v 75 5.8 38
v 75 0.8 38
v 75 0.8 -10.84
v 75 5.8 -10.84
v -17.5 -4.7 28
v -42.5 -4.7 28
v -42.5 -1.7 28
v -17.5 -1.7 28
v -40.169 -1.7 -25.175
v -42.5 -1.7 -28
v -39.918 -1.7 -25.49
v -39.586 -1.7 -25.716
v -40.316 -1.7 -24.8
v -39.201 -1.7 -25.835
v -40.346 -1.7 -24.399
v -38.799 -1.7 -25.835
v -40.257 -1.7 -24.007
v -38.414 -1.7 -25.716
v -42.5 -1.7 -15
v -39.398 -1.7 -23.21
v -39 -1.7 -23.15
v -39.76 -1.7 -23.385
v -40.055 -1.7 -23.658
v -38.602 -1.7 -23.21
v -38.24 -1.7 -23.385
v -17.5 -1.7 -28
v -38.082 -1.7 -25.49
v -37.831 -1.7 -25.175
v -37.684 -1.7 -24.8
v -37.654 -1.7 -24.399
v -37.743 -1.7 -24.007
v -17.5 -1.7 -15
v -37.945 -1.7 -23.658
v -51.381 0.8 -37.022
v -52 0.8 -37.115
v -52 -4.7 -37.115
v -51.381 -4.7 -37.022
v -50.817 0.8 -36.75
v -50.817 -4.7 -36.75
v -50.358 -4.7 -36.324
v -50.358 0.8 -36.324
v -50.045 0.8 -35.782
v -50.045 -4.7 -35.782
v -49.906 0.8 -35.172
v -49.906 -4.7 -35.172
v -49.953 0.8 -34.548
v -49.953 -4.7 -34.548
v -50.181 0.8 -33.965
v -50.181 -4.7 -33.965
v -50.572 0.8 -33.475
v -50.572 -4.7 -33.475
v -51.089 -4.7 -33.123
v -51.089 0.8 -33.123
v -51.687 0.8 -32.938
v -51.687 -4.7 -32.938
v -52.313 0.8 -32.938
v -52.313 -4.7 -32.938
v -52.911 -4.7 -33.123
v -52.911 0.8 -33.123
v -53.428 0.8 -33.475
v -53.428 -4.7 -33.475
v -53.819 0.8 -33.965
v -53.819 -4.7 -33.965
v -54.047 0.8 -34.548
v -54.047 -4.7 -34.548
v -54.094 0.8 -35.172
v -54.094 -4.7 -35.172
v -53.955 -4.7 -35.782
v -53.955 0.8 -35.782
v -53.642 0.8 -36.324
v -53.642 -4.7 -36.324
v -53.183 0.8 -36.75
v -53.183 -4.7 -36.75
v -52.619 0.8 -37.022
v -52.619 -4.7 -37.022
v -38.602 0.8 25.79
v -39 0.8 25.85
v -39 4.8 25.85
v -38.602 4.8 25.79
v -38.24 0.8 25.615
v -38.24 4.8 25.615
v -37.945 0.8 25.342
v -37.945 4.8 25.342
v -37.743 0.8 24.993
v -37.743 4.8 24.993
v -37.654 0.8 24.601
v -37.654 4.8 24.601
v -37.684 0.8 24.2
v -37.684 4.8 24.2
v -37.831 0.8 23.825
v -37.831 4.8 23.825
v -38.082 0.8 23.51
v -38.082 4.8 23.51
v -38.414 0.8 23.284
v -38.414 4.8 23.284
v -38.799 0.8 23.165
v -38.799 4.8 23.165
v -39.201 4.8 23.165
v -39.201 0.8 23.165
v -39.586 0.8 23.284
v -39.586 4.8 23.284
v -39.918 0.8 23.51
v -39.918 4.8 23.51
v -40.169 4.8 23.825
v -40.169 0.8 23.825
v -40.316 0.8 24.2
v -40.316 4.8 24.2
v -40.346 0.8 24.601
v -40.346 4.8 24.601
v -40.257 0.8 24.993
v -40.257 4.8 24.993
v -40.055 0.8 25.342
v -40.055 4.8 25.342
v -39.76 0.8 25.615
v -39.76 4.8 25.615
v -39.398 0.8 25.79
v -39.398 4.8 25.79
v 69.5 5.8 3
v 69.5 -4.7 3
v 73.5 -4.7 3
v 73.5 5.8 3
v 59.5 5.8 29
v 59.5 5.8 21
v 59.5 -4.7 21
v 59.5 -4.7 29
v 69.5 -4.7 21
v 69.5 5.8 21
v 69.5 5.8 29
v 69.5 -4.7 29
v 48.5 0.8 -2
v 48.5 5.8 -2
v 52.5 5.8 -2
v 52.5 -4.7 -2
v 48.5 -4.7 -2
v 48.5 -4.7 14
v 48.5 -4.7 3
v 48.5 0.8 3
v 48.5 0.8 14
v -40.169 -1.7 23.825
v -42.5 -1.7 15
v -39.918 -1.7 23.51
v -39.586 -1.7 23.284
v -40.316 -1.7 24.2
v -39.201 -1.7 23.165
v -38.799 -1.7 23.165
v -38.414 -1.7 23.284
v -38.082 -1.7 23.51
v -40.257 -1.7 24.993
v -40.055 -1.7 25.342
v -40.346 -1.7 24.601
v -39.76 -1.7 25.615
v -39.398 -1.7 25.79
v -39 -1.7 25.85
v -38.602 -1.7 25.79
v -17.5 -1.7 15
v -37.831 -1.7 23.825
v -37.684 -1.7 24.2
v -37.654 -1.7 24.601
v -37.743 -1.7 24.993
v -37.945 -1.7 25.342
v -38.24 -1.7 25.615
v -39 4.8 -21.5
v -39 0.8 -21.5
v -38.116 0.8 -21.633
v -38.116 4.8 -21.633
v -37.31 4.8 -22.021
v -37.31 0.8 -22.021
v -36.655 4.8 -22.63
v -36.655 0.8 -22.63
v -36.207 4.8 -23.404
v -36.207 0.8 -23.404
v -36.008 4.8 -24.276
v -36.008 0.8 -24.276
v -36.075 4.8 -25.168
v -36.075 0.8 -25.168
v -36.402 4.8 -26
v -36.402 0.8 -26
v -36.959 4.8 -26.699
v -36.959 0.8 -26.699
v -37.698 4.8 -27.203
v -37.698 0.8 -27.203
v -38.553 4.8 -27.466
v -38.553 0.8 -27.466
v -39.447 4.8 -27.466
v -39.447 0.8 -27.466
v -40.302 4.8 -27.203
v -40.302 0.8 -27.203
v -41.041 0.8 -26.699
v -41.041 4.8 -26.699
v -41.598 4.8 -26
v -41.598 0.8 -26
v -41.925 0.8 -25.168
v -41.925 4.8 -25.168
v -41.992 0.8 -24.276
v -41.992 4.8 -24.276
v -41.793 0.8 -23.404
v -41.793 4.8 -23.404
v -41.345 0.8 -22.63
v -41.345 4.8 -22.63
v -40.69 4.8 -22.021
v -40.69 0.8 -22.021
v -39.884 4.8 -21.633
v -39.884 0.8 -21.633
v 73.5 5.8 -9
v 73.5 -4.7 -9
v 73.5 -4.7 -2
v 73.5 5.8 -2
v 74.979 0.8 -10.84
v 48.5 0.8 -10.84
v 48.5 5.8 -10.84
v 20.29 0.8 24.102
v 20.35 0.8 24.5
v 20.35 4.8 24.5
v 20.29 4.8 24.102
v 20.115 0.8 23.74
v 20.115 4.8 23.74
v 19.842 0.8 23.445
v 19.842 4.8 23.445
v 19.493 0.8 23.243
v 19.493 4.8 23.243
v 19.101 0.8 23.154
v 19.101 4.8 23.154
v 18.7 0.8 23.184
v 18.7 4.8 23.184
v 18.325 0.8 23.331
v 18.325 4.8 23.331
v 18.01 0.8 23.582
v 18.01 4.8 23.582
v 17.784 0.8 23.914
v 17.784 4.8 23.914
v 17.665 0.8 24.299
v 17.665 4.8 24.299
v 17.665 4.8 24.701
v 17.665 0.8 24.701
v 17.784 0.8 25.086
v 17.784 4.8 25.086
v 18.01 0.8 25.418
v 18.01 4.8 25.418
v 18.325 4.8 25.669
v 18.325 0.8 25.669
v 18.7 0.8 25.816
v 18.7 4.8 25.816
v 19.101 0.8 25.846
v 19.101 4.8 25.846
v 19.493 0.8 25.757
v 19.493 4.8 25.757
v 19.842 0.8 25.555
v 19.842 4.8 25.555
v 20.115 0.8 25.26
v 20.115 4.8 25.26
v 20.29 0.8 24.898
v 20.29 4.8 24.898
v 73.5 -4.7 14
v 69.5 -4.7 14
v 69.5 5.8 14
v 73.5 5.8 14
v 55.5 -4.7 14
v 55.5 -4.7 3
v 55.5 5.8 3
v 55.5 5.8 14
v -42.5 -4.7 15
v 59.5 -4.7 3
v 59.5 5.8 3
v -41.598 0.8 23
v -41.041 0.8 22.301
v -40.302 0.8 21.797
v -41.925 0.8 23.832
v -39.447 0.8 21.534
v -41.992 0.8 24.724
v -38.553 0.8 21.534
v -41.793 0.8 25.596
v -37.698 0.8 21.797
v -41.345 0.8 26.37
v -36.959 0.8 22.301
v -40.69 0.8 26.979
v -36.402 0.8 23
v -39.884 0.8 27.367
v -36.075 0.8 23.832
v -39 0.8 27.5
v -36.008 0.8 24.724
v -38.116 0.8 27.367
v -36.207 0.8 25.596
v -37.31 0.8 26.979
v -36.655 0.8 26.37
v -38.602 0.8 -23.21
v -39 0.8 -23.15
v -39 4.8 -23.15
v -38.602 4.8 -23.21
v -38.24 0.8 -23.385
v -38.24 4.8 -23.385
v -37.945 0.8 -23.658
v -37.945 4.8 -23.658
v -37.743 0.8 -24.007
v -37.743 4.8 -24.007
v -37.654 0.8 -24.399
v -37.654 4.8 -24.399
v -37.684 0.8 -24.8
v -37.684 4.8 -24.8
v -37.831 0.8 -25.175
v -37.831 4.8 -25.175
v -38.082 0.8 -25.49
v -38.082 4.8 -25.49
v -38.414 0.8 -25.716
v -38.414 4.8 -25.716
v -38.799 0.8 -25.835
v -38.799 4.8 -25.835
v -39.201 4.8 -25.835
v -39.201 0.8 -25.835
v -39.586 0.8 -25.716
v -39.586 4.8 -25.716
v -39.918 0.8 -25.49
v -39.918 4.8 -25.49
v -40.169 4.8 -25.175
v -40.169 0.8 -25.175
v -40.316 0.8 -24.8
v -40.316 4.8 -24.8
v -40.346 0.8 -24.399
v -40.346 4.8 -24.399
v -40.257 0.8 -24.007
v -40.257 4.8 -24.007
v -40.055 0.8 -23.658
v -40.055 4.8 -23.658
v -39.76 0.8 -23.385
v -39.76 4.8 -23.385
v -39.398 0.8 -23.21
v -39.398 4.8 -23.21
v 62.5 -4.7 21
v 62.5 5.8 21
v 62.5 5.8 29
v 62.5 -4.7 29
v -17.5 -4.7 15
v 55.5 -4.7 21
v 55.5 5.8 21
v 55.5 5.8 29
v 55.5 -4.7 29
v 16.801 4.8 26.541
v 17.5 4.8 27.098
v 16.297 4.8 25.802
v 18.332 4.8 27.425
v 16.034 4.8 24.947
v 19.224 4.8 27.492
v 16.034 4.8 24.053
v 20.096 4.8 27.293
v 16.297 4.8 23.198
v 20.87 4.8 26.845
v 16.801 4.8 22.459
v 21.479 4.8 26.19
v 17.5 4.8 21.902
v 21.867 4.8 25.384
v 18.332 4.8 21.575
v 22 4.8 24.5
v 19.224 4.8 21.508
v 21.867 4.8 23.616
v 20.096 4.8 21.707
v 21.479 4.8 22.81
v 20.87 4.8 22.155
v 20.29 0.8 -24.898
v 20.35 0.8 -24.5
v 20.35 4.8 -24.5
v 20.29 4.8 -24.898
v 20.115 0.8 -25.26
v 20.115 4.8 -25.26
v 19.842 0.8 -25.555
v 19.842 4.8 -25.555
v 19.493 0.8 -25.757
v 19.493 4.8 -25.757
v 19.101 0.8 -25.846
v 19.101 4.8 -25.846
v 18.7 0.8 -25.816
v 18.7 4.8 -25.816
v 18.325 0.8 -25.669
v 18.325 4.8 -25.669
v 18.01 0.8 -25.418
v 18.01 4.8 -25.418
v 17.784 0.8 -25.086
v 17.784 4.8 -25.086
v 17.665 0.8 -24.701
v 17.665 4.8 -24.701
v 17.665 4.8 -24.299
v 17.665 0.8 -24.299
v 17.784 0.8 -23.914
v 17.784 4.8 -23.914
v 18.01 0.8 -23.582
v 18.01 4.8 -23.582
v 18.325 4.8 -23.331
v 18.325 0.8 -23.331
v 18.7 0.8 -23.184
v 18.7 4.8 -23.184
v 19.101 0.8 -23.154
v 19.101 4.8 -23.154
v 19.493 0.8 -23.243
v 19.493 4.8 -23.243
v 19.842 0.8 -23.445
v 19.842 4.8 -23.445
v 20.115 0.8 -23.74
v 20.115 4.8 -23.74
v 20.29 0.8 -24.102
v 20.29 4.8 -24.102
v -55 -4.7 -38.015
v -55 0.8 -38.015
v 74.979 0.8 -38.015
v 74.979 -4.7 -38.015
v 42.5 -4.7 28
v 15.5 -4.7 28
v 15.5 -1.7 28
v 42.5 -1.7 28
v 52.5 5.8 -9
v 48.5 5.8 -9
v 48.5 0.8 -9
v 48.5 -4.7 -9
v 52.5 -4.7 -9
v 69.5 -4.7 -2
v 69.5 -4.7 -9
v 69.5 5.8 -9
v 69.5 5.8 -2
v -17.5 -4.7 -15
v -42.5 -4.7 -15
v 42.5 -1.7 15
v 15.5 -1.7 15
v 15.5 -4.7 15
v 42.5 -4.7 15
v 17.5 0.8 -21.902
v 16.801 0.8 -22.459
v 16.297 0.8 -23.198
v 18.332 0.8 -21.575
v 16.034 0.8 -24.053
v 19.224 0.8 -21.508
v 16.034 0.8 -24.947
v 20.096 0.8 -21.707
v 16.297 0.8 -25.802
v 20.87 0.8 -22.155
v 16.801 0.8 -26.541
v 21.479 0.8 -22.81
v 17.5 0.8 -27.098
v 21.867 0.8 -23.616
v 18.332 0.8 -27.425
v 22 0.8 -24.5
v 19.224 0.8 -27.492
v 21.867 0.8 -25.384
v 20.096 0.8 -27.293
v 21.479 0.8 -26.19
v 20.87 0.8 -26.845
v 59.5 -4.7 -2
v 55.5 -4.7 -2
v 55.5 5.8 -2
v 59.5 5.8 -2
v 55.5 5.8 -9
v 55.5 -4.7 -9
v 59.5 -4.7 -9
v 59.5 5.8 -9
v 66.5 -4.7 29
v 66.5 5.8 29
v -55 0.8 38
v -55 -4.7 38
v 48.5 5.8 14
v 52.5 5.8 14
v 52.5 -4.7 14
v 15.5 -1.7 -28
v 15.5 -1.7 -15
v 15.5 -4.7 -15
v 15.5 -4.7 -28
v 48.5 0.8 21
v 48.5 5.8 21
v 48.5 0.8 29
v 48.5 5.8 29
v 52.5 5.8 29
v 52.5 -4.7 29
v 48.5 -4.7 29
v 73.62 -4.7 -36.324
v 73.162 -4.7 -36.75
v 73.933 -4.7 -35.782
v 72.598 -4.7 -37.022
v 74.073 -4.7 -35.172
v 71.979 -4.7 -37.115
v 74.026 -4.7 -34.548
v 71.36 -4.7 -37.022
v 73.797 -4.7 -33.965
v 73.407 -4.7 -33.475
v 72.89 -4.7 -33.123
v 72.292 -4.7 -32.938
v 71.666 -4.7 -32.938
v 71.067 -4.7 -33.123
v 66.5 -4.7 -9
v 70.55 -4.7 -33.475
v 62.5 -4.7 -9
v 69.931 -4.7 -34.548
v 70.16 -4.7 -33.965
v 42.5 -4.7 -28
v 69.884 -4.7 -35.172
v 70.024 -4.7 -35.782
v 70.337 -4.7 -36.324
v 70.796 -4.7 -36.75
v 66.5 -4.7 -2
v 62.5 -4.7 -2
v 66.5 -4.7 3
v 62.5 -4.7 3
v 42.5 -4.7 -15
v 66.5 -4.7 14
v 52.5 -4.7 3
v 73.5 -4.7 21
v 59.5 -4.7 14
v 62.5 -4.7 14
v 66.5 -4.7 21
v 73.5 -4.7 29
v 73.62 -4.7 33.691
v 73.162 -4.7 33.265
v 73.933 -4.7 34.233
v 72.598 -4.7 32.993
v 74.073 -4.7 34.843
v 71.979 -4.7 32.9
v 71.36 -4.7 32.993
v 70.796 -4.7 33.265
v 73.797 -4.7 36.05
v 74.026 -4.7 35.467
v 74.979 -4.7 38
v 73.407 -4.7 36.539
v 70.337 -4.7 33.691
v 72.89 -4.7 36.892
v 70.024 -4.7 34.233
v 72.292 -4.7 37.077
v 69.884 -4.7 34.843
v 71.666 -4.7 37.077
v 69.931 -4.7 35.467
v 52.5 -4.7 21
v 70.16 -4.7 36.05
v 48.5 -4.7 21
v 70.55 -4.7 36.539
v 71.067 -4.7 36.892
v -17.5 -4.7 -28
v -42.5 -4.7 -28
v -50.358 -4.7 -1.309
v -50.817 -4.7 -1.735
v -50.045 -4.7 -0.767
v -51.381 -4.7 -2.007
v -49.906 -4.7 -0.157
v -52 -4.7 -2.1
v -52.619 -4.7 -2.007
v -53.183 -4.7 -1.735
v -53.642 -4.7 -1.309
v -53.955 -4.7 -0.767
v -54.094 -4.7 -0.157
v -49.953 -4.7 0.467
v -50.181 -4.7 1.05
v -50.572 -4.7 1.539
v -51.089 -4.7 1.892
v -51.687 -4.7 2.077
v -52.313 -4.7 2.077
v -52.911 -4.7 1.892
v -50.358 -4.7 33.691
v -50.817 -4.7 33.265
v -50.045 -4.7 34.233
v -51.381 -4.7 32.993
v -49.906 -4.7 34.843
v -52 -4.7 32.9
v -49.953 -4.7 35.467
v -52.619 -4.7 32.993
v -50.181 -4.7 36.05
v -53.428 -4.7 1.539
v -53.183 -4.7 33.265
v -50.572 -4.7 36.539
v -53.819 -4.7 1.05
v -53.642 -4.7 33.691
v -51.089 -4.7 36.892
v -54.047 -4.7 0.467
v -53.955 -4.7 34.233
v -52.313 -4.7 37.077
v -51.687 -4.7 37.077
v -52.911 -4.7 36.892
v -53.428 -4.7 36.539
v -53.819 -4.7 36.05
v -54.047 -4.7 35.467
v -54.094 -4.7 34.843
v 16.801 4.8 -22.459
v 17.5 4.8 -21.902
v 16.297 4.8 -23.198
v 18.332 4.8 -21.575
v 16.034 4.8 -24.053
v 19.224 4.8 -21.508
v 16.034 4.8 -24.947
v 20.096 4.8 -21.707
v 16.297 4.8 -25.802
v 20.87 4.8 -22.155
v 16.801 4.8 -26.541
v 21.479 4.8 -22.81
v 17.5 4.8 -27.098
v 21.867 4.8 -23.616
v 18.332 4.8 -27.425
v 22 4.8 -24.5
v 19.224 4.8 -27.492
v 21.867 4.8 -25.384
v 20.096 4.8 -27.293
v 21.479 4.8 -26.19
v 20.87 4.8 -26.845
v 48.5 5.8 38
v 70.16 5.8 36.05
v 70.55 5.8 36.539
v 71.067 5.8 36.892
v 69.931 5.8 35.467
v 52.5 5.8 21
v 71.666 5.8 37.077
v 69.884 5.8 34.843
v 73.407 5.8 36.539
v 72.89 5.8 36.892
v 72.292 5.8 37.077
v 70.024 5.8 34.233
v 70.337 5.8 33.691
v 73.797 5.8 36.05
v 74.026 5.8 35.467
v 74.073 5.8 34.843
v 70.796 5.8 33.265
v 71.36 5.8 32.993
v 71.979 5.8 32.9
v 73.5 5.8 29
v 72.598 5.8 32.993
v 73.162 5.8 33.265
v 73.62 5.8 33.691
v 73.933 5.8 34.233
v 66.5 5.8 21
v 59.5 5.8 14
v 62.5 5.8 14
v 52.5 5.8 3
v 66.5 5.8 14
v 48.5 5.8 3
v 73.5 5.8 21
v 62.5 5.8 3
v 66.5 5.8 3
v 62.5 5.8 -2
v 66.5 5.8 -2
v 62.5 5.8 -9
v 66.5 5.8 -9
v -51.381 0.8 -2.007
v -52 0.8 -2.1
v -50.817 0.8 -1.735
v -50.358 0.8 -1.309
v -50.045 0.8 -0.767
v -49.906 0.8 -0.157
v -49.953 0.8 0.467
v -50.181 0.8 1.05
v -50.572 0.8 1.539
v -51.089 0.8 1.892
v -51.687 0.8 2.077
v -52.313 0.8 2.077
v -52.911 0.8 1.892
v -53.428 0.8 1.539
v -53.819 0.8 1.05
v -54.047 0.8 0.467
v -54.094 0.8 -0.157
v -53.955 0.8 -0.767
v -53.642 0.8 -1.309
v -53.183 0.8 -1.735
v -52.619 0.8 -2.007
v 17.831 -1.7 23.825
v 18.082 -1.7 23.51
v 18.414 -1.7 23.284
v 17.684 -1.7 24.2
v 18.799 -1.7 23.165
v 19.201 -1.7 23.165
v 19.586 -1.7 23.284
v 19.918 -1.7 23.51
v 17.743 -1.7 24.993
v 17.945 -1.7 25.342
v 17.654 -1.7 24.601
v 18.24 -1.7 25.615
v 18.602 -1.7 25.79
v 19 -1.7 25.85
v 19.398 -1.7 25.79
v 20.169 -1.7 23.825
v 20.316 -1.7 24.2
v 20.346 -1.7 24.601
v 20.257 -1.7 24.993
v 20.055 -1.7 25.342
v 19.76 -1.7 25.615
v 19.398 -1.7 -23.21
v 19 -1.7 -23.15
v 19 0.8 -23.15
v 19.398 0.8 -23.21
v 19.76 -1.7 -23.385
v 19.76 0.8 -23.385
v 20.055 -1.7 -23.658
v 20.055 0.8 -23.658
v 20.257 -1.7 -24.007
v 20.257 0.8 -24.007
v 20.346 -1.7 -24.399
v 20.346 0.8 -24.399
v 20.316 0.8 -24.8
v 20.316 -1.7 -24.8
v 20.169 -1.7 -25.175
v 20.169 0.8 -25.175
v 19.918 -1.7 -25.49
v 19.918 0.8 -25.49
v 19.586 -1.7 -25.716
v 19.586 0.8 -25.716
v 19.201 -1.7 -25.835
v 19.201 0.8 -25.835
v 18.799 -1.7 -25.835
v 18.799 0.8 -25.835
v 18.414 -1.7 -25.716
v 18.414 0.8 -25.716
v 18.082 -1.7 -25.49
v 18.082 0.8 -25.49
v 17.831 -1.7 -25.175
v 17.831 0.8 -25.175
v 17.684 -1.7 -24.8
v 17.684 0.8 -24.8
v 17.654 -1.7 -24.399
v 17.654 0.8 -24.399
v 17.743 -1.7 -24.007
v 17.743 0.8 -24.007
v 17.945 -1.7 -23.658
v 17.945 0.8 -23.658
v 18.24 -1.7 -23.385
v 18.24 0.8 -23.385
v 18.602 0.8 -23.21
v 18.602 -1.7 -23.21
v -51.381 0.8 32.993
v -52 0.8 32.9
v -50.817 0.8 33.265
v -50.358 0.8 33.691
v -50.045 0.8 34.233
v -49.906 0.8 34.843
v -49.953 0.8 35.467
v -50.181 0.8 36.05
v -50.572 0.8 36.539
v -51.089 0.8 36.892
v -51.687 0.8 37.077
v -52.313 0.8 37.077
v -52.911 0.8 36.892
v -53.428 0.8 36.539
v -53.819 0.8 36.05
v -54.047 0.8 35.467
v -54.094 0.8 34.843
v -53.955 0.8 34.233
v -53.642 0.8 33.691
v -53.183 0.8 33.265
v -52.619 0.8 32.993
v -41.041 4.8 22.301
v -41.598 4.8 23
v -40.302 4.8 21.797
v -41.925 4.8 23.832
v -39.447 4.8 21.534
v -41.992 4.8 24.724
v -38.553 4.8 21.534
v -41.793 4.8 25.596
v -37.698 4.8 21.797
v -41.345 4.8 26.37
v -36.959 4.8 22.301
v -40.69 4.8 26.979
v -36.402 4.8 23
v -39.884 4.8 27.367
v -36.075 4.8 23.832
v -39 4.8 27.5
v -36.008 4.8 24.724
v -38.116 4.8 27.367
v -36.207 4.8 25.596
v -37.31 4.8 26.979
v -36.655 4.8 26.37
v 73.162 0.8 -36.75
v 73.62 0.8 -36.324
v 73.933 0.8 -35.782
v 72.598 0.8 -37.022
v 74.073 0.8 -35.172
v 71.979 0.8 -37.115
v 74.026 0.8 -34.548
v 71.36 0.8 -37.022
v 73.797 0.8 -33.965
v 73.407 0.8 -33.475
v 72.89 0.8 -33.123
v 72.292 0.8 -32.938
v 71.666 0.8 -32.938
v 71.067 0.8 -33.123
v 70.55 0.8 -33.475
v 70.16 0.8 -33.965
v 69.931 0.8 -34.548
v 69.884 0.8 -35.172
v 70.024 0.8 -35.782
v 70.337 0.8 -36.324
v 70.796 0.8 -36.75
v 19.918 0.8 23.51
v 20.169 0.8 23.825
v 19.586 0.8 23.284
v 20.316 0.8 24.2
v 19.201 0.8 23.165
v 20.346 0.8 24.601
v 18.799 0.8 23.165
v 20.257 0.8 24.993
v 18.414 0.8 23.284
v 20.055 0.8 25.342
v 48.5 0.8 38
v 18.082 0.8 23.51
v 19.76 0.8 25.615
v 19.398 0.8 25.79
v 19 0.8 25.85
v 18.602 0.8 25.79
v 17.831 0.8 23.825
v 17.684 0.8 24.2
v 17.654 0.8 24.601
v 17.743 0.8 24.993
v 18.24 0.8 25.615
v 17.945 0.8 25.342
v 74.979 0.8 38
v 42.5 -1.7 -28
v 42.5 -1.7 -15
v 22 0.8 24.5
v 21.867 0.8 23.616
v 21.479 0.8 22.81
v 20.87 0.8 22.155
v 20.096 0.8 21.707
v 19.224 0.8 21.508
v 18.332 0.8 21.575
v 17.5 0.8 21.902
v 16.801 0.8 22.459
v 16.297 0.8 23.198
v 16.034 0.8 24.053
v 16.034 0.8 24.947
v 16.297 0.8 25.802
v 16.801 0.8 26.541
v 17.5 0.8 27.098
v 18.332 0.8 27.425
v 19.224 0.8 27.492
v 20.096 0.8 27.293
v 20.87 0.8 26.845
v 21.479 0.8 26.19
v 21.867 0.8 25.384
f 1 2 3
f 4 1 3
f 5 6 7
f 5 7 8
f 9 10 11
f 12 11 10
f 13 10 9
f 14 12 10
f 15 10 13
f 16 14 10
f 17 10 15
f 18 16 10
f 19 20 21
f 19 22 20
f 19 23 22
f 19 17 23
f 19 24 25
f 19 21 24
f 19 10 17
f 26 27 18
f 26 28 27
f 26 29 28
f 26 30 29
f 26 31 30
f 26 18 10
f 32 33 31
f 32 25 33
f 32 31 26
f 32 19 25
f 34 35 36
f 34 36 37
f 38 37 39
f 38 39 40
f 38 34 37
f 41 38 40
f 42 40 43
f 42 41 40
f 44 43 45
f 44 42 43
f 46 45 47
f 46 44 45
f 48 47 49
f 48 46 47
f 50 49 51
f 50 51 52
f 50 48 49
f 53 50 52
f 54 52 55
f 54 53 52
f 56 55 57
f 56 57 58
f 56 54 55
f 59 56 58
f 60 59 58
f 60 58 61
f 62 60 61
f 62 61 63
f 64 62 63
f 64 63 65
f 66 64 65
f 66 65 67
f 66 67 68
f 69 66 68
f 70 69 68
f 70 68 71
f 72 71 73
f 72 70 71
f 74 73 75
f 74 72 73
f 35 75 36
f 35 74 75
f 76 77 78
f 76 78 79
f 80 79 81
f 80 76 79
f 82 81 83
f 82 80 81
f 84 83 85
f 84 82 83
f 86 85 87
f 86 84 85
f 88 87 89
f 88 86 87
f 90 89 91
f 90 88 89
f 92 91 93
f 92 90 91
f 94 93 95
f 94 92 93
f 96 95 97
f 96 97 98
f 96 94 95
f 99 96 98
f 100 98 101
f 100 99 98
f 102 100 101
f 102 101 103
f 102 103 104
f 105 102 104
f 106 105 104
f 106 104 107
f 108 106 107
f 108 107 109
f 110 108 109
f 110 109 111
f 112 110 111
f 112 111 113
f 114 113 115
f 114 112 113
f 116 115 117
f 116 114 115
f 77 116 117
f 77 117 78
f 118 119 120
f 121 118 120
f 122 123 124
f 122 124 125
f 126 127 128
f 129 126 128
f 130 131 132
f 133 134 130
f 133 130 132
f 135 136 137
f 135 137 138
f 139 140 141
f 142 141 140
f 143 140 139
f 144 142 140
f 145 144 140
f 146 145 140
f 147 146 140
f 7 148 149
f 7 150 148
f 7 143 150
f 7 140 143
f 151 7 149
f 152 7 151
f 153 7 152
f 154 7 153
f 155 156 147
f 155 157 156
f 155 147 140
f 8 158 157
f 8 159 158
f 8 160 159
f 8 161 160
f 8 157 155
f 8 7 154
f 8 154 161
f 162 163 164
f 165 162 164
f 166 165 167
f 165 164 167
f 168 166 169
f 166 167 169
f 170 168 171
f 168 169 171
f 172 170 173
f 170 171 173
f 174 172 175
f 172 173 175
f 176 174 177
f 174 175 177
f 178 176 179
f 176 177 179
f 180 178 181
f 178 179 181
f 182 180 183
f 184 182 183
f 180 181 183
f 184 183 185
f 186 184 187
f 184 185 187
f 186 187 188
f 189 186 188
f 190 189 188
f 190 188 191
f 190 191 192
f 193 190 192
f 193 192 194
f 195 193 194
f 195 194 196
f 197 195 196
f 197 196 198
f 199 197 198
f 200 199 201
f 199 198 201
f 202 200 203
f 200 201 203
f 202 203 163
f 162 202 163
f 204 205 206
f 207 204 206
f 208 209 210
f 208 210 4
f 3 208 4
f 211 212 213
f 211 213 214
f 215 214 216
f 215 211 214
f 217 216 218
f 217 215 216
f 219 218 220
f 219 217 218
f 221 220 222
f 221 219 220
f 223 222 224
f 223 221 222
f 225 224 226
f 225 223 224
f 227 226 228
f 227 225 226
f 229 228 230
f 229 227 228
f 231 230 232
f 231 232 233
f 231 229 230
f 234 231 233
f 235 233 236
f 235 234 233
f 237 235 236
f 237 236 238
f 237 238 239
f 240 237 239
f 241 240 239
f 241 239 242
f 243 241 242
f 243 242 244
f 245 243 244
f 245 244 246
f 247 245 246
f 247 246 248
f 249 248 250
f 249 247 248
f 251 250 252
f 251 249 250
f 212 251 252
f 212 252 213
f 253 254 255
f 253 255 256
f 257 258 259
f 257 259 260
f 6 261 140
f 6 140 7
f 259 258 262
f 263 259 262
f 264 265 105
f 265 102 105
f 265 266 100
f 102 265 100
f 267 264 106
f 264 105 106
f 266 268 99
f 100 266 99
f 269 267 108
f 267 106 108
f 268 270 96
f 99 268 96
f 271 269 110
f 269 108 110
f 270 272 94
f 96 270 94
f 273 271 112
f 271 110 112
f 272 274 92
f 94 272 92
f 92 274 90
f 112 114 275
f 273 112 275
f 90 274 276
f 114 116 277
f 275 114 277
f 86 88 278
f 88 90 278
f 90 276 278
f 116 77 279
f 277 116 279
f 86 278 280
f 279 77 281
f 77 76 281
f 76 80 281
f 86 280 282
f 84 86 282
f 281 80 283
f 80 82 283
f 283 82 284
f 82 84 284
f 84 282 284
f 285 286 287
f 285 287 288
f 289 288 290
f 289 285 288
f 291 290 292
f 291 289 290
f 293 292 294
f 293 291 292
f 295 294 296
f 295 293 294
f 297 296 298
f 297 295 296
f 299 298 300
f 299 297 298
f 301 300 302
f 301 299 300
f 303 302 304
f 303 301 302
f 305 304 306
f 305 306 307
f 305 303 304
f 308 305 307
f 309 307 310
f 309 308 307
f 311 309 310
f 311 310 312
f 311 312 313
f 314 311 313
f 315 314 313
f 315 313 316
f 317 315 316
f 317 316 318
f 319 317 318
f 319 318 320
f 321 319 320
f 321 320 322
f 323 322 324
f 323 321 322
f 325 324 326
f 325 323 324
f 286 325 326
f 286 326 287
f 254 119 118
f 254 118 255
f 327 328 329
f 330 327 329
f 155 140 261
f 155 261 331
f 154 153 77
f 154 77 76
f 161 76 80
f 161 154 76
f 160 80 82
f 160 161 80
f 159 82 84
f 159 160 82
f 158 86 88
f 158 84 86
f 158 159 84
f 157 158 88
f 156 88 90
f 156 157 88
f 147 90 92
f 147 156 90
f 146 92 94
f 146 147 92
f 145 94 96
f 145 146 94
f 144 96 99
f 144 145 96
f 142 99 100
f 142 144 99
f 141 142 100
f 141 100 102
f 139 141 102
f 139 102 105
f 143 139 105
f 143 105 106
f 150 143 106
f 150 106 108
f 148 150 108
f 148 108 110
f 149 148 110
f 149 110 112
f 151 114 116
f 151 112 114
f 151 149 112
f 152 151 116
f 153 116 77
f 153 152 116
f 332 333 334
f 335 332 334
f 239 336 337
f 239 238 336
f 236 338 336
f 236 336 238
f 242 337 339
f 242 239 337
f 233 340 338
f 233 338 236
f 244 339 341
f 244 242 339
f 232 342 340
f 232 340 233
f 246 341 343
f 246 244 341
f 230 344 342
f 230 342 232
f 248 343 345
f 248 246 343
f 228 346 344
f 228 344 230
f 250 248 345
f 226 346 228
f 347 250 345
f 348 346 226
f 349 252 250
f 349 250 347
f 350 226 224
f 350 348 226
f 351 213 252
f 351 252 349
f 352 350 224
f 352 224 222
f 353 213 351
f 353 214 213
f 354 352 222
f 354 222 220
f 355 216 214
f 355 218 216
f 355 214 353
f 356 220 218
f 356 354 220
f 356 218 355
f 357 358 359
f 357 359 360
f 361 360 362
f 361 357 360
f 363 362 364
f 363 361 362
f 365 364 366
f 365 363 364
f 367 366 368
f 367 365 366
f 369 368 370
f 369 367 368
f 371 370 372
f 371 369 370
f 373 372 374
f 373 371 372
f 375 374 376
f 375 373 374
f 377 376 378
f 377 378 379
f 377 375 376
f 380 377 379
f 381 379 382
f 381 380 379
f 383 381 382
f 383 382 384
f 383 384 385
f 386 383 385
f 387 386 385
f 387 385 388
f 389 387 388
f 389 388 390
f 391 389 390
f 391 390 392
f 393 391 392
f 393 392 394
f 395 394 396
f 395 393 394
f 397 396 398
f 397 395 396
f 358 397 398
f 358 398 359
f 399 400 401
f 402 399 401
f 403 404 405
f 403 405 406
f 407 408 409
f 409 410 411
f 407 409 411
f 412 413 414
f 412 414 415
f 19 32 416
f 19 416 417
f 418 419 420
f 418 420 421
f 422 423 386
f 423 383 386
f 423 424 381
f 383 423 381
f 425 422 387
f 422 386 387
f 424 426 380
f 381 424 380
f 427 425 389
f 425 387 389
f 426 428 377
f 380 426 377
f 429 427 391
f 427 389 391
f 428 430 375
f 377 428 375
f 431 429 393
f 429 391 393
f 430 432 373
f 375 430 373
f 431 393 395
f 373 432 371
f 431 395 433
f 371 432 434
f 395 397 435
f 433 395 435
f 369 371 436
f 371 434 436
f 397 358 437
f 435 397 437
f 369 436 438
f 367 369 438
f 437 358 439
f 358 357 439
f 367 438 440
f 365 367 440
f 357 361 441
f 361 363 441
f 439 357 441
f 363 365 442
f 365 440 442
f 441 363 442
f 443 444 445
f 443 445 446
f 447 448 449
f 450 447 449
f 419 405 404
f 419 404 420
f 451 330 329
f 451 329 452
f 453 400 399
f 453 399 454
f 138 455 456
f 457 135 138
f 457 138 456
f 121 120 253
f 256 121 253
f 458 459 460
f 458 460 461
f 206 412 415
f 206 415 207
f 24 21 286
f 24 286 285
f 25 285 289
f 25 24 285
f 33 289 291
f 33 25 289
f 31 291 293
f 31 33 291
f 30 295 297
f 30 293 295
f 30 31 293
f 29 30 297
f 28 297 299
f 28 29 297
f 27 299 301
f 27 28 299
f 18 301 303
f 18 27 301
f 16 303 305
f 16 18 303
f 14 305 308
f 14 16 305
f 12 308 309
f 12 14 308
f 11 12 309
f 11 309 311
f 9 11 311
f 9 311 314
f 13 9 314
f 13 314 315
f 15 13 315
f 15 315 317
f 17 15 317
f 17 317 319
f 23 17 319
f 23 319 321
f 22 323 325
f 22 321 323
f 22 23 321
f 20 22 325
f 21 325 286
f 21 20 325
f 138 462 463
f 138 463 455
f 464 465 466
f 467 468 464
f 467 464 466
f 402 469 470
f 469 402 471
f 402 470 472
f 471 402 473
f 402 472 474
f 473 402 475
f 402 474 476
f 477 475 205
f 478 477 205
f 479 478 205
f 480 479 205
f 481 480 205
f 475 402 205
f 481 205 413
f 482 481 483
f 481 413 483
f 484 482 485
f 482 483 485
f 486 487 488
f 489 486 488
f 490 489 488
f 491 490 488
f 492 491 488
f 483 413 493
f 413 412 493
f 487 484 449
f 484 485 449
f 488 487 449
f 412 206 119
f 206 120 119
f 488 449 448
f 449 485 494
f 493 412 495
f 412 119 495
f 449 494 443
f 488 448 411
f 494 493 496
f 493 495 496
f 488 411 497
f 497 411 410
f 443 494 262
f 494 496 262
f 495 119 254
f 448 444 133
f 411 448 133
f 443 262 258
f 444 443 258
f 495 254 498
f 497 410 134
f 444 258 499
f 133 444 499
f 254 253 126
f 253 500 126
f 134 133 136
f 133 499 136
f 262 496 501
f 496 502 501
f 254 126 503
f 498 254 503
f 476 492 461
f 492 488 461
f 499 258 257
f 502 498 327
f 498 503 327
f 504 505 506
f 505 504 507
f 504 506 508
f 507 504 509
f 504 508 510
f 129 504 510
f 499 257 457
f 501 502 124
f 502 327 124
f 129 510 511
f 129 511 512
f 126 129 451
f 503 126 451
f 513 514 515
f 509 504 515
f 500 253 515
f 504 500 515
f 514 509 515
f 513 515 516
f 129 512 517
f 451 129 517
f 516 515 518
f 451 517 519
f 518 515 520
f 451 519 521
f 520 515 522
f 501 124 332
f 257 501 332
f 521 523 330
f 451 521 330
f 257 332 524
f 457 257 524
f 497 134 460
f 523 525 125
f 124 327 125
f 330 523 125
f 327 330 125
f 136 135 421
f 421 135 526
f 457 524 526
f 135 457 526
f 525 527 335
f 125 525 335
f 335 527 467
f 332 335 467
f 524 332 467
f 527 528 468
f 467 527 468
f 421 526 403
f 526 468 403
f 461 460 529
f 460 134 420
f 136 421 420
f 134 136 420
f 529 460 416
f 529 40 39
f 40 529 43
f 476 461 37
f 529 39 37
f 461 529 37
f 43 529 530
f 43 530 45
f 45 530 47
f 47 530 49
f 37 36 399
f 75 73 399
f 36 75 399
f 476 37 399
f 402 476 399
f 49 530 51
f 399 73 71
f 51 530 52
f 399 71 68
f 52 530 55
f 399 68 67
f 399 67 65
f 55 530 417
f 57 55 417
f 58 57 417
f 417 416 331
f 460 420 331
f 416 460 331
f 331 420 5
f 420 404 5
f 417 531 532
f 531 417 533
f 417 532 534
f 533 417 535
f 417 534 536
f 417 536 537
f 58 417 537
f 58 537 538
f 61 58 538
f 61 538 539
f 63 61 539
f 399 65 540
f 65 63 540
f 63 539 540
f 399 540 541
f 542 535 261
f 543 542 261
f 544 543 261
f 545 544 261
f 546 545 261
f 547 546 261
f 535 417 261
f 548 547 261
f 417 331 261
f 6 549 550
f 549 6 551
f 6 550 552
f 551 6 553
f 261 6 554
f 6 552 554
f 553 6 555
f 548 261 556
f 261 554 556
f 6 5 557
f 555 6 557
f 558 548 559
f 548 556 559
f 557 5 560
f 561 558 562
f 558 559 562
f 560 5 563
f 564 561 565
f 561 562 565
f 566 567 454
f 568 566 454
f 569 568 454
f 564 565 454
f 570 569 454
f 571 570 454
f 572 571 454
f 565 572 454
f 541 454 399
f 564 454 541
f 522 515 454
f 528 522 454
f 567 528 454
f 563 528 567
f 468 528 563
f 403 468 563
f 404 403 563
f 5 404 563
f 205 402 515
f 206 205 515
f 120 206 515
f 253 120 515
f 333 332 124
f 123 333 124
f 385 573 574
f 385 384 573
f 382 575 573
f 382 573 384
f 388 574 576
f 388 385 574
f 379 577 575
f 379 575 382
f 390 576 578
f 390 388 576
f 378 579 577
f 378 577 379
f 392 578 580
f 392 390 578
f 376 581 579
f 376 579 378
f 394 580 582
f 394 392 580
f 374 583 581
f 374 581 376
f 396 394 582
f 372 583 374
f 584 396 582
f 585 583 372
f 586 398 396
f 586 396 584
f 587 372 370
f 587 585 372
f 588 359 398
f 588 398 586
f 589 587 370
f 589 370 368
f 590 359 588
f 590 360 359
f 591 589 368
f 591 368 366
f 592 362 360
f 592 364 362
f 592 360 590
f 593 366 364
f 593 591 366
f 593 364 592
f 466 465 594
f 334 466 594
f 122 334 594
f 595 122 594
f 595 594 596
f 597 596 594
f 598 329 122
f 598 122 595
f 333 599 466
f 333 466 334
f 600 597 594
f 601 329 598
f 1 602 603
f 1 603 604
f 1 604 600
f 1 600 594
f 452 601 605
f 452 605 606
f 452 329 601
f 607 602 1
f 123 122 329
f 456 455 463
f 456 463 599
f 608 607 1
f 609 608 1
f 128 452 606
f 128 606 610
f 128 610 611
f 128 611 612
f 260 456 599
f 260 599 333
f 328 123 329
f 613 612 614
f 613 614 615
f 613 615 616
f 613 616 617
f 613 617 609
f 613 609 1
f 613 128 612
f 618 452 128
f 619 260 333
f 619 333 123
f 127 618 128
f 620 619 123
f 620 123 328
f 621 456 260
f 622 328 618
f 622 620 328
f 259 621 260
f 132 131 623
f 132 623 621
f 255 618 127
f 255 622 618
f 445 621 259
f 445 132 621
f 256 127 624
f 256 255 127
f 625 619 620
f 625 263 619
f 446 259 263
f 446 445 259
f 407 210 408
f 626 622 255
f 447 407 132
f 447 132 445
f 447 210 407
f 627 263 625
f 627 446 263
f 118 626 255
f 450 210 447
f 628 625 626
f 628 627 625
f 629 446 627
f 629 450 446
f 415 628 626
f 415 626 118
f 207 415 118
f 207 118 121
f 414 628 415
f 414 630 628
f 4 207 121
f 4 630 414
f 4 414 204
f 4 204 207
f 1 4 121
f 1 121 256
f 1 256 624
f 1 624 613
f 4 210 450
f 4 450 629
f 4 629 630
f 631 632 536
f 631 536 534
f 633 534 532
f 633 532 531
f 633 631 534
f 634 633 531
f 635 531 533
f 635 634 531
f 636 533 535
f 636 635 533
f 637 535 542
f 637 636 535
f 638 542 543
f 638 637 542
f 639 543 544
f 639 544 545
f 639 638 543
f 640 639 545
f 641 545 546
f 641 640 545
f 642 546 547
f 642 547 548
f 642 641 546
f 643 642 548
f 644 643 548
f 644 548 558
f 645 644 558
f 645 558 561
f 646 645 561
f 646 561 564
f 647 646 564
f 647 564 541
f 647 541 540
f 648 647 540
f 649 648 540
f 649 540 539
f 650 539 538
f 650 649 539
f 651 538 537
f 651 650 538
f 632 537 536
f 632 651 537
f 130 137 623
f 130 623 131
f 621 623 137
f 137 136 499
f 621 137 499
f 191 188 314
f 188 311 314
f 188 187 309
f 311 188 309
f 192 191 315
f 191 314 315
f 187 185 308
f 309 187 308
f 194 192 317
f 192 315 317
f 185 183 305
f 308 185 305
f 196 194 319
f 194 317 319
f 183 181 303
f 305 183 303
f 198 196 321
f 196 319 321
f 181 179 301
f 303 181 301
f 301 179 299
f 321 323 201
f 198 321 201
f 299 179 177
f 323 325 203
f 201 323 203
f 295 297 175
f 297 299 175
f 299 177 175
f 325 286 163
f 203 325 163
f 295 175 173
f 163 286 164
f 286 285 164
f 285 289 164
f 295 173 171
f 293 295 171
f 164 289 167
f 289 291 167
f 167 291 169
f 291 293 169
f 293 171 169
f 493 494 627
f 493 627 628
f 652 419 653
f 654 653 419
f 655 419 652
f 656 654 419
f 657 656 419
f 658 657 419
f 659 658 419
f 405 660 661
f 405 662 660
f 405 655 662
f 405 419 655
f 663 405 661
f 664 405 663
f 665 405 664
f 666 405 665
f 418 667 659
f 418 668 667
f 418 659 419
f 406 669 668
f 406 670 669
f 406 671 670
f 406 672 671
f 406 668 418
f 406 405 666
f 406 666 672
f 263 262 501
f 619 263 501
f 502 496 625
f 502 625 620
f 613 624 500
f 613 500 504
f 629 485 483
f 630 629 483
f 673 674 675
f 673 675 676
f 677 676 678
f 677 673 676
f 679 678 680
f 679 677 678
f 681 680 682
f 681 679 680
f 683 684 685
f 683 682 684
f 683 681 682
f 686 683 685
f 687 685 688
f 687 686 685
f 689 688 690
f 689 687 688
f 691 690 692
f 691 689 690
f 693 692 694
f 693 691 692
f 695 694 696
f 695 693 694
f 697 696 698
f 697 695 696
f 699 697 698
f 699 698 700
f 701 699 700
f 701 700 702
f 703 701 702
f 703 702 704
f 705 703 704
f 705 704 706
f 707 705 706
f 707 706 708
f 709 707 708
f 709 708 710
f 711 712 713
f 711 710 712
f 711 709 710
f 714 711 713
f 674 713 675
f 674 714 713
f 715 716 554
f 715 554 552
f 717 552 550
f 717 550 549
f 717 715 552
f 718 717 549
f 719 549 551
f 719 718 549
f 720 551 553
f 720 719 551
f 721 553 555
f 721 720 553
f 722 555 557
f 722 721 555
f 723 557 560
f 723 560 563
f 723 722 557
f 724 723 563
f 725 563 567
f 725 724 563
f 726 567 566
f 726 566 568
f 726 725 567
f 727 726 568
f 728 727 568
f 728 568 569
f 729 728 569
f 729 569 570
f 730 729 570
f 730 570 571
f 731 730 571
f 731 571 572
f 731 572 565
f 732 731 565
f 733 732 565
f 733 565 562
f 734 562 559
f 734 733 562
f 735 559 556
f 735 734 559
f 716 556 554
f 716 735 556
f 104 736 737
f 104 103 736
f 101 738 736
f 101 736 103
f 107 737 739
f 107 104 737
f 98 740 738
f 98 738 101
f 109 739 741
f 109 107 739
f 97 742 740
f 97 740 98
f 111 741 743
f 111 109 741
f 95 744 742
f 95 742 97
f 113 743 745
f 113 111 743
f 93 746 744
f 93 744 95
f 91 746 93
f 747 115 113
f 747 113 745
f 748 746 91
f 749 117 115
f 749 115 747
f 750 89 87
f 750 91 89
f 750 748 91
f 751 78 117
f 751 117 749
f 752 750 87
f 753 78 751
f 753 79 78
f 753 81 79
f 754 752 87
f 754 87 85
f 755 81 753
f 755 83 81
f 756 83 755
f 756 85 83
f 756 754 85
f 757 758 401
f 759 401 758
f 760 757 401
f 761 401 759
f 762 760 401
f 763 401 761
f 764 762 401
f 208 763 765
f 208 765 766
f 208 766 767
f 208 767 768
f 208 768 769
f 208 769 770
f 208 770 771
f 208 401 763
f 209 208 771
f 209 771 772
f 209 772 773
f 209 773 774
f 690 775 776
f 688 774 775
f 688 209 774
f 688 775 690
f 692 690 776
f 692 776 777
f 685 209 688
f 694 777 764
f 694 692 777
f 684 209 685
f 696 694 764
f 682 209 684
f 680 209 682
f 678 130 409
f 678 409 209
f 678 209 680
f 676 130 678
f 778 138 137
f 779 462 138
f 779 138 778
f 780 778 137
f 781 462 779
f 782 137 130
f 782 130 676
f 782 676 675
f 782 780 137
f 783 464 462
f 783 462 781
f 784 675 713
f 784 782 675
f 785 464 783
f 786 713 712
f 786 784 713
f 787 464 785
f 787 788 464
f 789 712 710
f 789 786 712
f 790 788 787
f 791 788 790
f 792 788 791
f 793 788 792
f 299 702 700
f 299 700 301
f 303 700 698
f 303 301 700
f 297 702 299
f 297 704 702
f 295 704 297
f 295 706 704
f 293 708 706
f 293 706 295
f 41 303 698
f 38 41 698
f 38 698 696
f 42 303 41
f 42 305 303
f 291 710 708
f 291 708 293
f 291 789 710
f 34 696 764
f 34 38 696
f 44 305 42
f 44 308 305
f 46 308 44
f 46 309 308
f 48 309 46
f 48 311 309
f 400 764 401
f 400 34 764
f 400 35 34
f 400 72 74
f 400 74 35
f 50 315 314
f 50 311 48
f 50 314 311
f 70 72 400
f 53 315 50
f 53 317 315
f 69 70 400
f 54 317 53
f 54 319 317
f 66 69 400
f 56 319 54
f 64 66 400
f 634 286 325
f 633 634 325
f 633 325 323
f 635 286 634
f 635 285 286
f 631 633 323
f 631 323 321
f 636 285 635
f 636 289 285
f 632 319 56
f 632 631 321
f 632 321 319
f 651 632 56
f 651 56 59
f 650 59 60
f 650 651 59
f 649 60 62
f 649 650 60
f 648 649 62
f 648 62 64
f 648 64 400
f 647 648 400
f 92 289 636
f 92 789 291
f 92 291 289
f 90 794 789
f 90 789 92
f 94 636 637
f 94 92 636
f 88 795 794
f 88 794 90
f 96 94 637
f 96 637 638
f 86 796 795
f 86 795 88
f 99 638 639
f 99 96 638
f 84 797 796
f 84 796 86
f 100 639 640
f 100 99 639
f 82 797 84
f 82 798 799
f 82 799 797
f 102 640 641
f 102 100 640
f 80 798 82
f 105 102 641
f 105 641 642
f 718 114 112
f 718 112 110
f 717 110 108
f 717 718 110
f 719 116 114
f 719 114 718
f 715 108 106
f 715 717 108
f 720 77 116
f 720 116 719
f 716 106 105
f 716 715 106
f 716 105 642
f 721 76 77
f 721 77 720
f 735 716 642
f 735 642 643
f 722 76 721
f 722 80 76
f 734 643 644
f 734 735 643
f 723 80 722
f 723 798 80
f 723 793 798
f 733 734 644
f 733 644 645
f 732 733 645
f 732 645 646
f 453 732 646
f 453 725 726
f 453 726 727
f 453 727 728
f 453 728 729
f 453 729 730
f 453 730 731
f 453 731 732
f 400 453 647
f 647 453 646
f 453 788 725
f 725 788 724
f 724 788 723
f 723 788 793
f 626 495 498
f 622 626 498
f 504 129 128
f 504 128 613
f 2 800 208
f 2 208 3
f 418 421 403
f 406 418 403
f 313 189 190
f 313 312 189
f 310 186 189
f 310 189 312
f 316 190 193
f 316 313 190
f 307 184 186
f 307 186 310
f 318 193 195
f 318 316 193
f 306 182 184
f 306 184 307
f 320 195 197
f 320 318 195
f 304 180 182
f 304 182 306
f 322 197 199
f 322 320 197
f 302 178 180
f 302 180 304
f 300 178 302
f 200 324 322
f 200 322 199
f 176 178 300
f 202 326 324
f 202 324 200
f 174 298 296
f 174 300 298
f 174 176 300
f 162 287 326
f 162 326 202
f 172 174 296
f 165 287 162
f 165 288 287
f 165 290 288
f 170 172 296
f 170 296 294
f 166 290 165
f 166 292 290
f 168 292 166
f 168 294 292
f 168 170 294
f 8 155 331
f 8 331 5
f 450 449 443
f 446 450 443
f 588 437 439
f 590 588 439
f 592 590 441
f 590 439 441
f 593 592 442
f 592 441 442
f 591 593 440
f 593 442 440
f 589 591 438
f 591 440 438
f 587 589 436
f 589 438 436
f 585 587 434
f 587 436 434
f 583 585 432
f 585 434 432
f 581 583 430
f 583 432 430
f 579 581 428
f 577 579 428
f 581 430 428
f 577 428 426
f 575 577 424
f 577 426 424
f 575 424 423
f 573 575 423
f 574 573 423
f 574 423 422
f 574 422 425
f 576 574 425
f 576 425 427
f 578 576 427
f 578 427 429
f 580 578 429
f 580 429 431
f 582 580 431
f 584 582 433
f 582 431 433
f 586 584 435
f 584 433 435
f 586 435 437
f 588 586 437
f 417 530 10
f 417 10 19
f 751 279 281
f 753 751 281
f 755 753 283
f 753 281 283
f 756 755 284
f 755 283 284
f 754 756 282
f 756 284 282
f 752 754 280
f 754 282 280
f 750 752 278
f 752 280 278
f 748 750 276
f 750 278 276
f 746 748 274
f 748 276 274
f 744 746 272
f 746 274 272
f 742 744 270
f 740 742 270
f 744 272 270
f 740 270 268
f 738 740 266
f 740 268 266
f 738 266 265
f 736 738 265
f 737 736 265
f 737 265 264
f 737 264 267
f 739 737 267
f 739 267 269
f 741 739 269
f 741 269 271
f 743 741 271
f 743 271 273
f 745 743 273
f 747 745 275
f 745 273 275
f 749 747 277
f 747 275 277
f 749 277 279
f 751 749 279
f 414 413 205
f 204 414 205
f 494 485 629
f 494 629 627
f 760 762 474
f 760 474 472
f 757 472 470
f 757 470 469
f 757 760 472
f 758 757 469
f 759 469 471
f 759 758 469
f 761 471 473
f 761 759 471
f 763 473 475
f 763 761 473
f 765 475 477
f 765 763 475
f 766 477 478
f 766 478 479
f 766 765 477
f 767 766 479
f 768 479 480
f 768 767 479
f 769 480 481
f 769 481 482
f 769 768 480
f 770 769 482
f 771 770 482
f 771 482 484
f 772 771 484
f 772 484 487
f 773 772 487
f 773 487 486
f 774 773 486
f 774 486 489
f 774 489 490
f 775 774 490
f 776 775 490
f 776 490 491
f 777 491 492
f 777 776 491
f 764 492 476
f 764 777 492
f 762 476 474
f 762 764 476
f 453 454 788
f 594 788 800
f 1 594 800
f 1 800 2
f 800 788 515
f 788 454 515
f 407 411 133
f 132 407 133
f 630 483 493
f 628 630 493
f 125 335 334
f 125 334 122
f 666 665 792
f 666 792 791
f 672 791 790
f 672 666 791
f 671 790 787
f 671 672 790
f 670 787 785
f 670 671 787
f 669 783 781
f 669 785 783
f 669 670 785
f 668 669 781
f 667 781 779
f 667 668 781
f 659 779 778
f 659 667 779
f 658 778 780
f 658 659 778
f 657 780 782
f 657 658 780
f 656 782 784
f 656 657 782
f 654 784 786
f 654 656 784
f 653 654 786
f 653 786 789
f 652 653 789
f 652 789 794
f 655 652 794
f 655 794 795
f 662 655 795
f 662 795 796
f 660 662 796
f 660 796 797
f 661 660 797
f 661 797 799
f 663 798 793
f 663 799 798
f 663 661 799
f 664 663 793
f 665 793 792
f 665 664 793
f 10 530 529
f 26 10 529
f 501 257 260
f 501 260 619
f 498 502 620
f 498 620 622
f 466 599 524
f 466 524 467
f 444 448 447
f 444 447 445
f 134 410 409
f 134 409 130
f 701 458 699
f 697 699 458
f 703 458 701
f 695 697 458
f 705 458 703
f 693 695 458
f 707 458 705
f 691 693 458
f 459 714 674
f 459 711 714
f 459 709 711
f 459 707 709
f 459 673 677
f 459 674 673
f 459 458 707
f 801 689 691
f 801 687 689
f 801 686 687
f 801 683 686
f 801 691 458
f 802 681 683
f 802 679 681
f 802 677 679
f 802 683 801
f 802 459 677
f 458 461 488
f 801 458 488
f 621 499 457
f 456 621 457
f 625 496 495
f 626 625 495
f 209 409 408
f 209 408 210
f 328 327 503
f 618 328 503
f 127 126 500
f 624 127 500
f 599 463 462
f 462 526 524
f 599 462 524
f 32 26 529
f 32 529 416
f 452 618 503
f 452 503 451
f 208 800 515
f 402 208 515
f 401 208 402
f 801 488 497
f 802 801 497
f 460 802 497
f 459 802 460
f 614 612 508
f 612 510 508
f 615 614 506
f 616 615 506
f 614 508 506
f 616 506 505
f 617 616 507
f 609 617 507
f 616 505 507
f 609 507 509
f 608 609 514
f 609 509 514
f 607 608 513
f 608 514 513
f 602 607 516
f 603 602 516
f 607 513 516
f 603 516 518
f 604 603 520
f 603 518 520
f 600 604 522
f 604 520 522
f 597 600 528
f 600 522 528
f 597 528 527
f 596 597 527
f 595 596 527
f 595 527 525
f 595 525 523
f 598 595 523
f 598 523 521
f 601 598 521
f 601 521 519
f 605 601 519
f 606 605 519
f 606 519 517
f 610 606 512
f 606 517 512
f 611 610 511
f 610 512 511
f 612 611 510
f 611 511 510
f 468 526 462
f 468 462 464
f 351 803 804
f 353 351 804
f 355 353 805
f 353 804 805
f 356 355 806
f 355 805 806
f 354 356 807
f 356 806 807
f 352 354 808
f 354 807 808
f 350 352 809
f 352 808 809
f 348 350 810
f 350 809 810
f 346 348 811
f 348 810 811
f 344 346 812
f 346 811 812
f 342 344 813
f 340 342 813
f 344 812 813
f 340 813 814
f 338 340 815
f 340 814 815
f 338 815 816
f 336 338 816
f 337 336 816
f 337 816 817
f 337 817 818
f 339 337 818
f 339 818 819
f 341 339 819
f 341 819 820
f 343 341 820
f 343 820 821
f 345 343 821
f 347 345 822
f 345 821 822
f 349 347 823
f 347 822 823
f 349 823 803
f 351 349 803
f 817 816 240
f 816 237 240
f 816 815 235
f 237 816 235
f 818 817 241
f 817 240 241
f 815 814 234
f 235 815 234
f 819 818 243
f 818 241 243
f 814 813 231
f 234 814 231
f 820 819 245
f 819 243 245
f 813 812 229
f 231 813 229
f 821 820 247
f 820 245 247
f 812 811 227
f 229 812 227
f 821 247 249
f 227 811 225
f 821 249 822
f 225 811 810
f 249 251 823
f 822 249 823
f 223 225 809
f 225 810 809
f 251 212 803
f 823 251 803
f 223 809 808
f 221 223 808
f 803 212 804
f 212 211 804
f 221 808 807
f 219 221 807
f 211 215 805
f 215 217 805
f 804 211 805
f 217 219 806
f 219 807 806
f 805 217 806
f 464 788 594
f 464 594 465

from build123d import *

# Parameters (mm, degrees)
BASES_W                         = 85
BASES_H                         = 56
BASE_DEPTH                      = 0.8
M2_5_CLEARANCE_HOLE_D           = 2.7
FASTENERAREA_START              = -0.01
FASTENERAREAS_R                 = 3
FASTENERAREAS_R_2               = 1.35
FASTENERAREA_DEPTH              = 0.01
FASTENERAREAS_2_R               = 3
FASTENERAREAS_2_R_2             = 1.35
BOSS_EXTRUDE1_DEPTH             = 4
BOSS_EXTRUDE1_2_DEPTH           = 4
HLP_START                       = 0.8
HLP_FASTENERHOLES_OUTLINE_R     = 3
HLP_FASTENERHOLES_OUTLINE_R_2   = 1.35
HLP_FASTENERHOLES_DEPTH         = 4
HLP_FASTENERHOLES_2_OUTLINE_R   = 3
HLP_FASTENERHOLES_2_OUTLINE_R_2 = 1.35
HLP_FASTENERHOLES_2_DEPTH       = 4
HLP_START_2                     = -2
HLP_FASTENERHOLES_3_OUTLINE_R   = 1.35
HLP_FASTENERHOLES_3_DEPTH       = 4
HLP_START_3                     = 0.79
HLP_FASTENERHOLES_4_OUTLINE_R   = 3
HLP_FASTENERHOLES_4_OUTLINE_R_2 = 1.35
HLP_FASTENERHOLES_4_DEPTH       = 1.21
SKETCH4_R                       = 2.1
BOSS_EXTRUDE2_DEPTH             = 5.5
SKETCH7_W                       = 85
SKETCH7_H                       = 56
CUT_EXTRUDE4_DEPTH              = 3
CUT_EXTRUDE5_DEPTH              = 85.244641278
CUT_EXTRUDE5_DEPTH_BACK         = 85.244641278
SKETCH8_R                       = 1.35
SKETCH9_W                       = 26.5
SKETCH9_H                       = 48.839975475
BOSS_EXTRUDE3_DEPTH             = 5
SKETCH12_R                      = 2.1
SKETCH12_W                      = 4
SKETCH12_H                      = 11
SKETCH12_H_2                    = 8
SKETCH12_H_3                    = 7
CUT_EXTRUDE6_DEPTH              = 85.737106223
BOSS_EXTRUDE4_DEPTH             = 3


with BuildPart() as part:
    # BaseS → Base (new, symmetric)
    with BuildSketch(Plane(origin=(0, 0, 0), x_dir=(1, 0, 0), z_dir=(0, 1, 0))):
        Rectangle(BASES_W, BASES_H)
    extrude(amount=BASE_DEPTH, both=True)

    # M2.5 Clearance Hole (through all)
    with Locations(Plane(origin=(0, 0.8, 0), x_dir=(1, 0, 0), z_dir=(0, 1, 0))):
        with Locations((-39, 24.5), (-39, -24.5)):
            Hole(M2_5_CLEARANCE_HOLE_D / 2)

    # FastenerAreaS → FastenerArea (cut)
    # profile 1 of 2: a face of its own
    with BuildSketch(Plane(origin=(0, 0.8, 0), x_dir=(1, 0, 0), z_dir=(0, 1, 0)).offset(FASTENERAREA_START)):
        with Locations(Location((-39, -24.5, 0), (0, 0, 270))):
            Circle(FASTENERAREAS_R)
        with Locations(Location((-39, -24.5, 0), (0, 0, 270))):
            Circle(FASTENERAREAS_R_2, mode=Mode.SUBTRACT)
    # profile 2 of 2: a face of its own
    with BuildSketch(Plane(origin=(0, 0.8, 0), x_dir=(1, 0, 0), z_dir=(0, 1, 0)).offset(FASTENERAREA_START)):
        with Locations(Location((-39, 24.5, 0), (0, 0, 270))):
            Circle(FASTENERAREAS_R)
        with Locations(Location((-39, 24.5, 0), (0, 0, 270))):
            Circle(FASTENERAREAS_R_2, mode=Mode.SUBTRACT)
    fastenerarea = extrude(amount=FASTENERAREA_DEPTH, mode=Mode.SUBTRACT)

    # HLP FastenerHoles 3 outline → HLP FastenerHoles 3 (cut)
    with BuildSketch(Plane(origin=(0, 0, 0), x_dir=(1, 0, 0), z_dir=(0, 1, 0)).offset(HLP_START_2)):
        with Locations((19, -24.5)):
            Circle(HLP_FASTENERHOLES_3_OUTLINE_R)
        with Locations((19, 24.5)):
            Circle(HLP_FASTENERHOLES_3_OUTLINE_R)
    hlp_fastenerholes_3 = extrude(amount=HLP_FASTENERHOLES_3_DEPTH, mode=Mode.SUBTRACT)

    # HLP FastenerHoles 4 outline → HLP FastenerHoles 4 (cut)
    # profile 1 of 2: a face of its own
    with BuildSketch(Plane(origin=(0, 0, 0), x_dir=(1, 0, 0), z_dir=(0, 1, 0)).offset(HLP_START_3)):
        with Locations((19, 24.5)):
            Circle(HLP_FASTENERHOLES_4_OUTLINE_R)
        with Locations((19, 24.5)):
            Circle(HLP_FASTENERHOLES_4_OUTLINE_R_2, mode=Mode.SUBTRACT)
    # profile 2 of 2: a face of its own
    with BuildSketch(Plane(origin=(0, 0, 0), x_dir=(1, 0, 0), z_dir=(0, 1, 0)).offset(HLP_START_3)):
        with Locations((19, -24.5)):
            Circle(HLP_FASTENERHOLES_4_OUTLINE_R)
        with Locations((19, -24.5)):
            Circle(HLP_FASTENERHOLES_4_OUTLINE_R_2, mode=Mode.SUBTRACT)
    hlp_fastenerholes_4 = extrude(amount=HLP_FASTENERHOLES_4_DEPTH, mode=Mode.SUBTRACT)


with BuildPart() as body_2:
    # FastenerAreaS<2> → Boss-Extrude1 (new body)
    with BuildSketch(Plane(origin=(0, 0.8, 0), x_dir=(1, 0, 0), z_dir=(0, 1, 0))):
        with Locations(Location((-39, -24.5, 0), (0, 0, 270))):
            Circle(FASTENERAREAS_2_R)
        with Locations(Location((-39, -24.5, 0), (0, 0, 270))):
            Circle(FASTENERAREAS_2_R_2, mode=Mode.SUBTRACT)
    extrude(amount=BOSS_EXTRUDE1_DEPTH)


with BuildPart() as body_3:
    # FastenerAreaS<2> → Boss-Extrude1 2 (new body)
    with BuildSketch(Plane(origin=(0, 0.8, 0), x_dir=(1, 0, 0), z_dir=(0, 1, 0))):
        with Locations(Location((-39, 24.5, 0), (0, 0, 270))):
            Circle(FASTENERAREAS_2_R)
        with Locations(Location((-39, 24.5, 0), (0, 0, 270))):
            Circle(FASTENERAREAS_2_R_2, mode=Mode.SUBTRACT)
    extrude(amount=BOSS_EXTRUDE1_2_DEPTH)


with BuildPart() as body_4:
    # HLP FastenerHoles: read off the stored shape, not the designer's step
    # HLP FastenerHoles outline → HLP FastenerHoles (new body)
    with BuildSketch(Plane(origin=(0, 0, 0), x_dir=(1, 0, 0), z_dir=(0, 1, 0)).offset(HLP_START)):
        with Locations((19, 24.5)):
            Circle(HLP_FASTENERHOLES_OUTLINE_R)
        with Locations((19, 24.5)):
            Circle(HLP_FASTENERHOLES_OUTLINE_R_2, mode=Mode.SUBTRACT)
    hlp_fastenerholes = extrude(amount=HLP_FASTENERHOLES_DEPTH)


with BuildPart() as body_5:
    # HLP FastenerHoles 2 outline → HLP FastenerHoles 2 (new body)
    with BuildSketch(Plane(origin=(0, 0, 0), x_dir=(1, 0, 0), z_dir=(0, 1, 0)).offset(HLP_START)):
        with Locations((19, -24.5)):
            Circle(HLP_FASTENERHOLES_2_OUTLINE_R)
        with Locations((19, -24.5)):
            Circle(HLP_FASTENERHOLES_2_OUTLINE_R_2, mode=Mode.SUBTRACT)
    hlp_fastenerholes_2 = extrude(amount=HLP_FASTENERHOLES_2_DEPTH)


with BuildPart() as part_1:
    add(part.part)

    # VM FA: FastenerArea, HLP FastenerHoles, HLP FastenerHoles 2, HLP FastenerHoles 3, HLP FastenerHoles 4 across plane
    add(fastenerarea.mirror(Plane.ZX), mode=Mode.SUBTRACT)
    add(hlp_fastenerholes.mirror(Plane.ZX), mode=Mode.SUBTRACT)
    add(hlp_fastenerholes_2.mirror(Plane.ZX), mode=Mode.SUBTRACT)
    add(hlp_fastenerholes_3.mirror(Plane.ZX), mode=Mode.SUBTRACT)
    add(hlp_fastenerholes_4.mirror(Plane.ZX), mode=Mode.SUBTRACT)

    # Sketch4 → Boss-Extrude2 (add)
    with BuildSketch(Plane.XZ.offset(-0.8)):
        Polygon((55.021462019, -38.014828304), (-55, -38.014828304), (-55, 38), (54.978546352, 38), (74.978546352, 38), (74.978546352, -38.014828304), align=None)
        with Locations(Location((-52, 35, 0), (0, 0, 270))):
            Circle(SKETCH4_R, mode=Mode.SUBTRACT)
        with Locations(Location((-52, -35.014828304, 0), (0, 0, 270))):
            Circle(SKETCH4_R, mode=Mode.SUBTRACT)
        with Locations(Location((71.978546352, -35.014828304, 0), (0, 0, 270))):
            Circle(SKETCH4_R, mode=Mode.SUBTRACT)
        with Locations(Location((71.978546352, 35, 0), (0, 0, 270))):
            Circle(SKETCH4_R, mode=Mode.SUBTRACT)
        with Locations(Location((-52, 0, 0), (0, 0, 270))):
            Circle(SKETCH4_R, mode=Mode.SUBTRACT)
    extrude(amount=BOSS_EXTRUDE2_DEPTH)

    # Sketch7 → Cut-Extrude4 (cut)
    with BuildSketch(Plane.XZ.offset(4.7)):
        Rectangle(SKETCH7_W, SKETCH7_H)
    extrude(amount=-CUT_EXTRUDE4_DEPTH, mode=Mode.SUBTRACT)

    # Sketch8 → Cut-Extrude5 (cut, two sides: drawn at the far end of the back side and taken through both)
    with BuildSketch(Plane(origin=(0, 0.8, 0), x_dir=(1, 0, 0), z_dir=(0, 1, 0)).offset(-CUT_EXTRUDE5_DEPTH_BACK)):
        with Locations(Location((19, -24.5, 0), (0, 0, 270))):
            Circle(SKETCH8_R)
        with Locations(Location((19, 24.5, 0), (0, 0, 270))):
            Circle(SKETCH8_R)
        with Locations(Location((-39, 24.5, 0), (0, 0, 270))):
            Circle(SKETCH8_R)
        with Locations(Location((-39, -24.5, 0), (0, 0, 270))):
            Circle(SKETCH8_R)
    extrude(amount=CUT_EXTRUDE5_DEPTH + CUT_EXTRUDE5_DEPTH_BACK, mode=Mode.SUBTRACT)

    # Sketch9 → Boss-Extrude3 (add)
    with BuildSketch(Plane(origin=(0, 0.8, 0), x_dir=(1, 0, 0), z_dir=(0, 1, 0))):
        with Locations((61.75, -13.580012262)):
            Rectangle(SKETCH9_W, SKETCH9_H)
    extrude(amount=BOSS_EXTRUDE3_DEPTH)

    # Sketch12 → Cut-Extrude6 (cut, through all)
    with BuildSketch(Plane.XZ.offset(4.7)):
        with Locations(Location((71.978546352, 35, 0), (0, 0, 270))):
            Circle(SKETCH12_R)
        with Locations(Location((71.978546352, -35.014828304, 0), (0, 0, 270))):
            Circle(SKETCH12_R)
        with Locations((57.5, 8.5)):
            Rectangle(SKETCH12_W, SKETCH12_H)
        with Locations((50.5, 8.5)):
            Rectangle(SKETCH12_W, SKETCH12_H)
        with Locations((64.5, 8.5)):
            Rectangle(SKETCH12_W, SKETCH12_H)
        with Locations((71.5, 8.5)):
            Rectangle(SKETCH12_W, SKETCH12_H)
        with Locations((50.5, 25)):
            Rectangle(SKETCH12_W, SKETCH12_H_2)
        with Locations((57.5, 25)):
            Rectangle(SKETCH12_W, SKETCH12_H_2)
        with Locations((64.5, 25)):
            Rectangle(SKETCH12_W, SKETCH12_H_2)
        with Locations((71.5, 25)):
            Rectangle(SKETCH12_W, SKETCH12_H_2)
        with Locations((50.5, -5.5)):
            Rectangle(SKETCH12_W, SKETCH12_H_3)
        with Locations((57.5, -5.5)):
            Rectangle(SKETCH12_W, SKETCH12_H_3)
        with Locations((64.5, -5.5)):
            Rectangle(SKETCH12_W, SKETCH12_H_3)
        with Locations((71.5, -5.5)):
            Rectangle(SKETCH12_W, SKETCH12_H_3)
    extrude(amount=-CUT_EXTRUDE6_DEPTH, mode=Mode.SUBTRACT)

    # Sketch13 → Boss-Extrude4 (add)
    with BuildSketch(Plane.XZ.offset(1.7)):
        Polygon((-42.5, -15), (-42.5, 15), (-17.5, 15), (-17.5, 28), (15.5, 28), (15.5, 15), (42.5, 15), (42.5, -15), (15.5, -15), (15.5, -28), (-17.5, -28), (-17.5, -15), align=None)
    extrude(amount=BOSS_EXTRUDE4_DEPTH)


solid = Compound([body_2.part, body_3.part, body_4.part, body_5.part, part_1.part])
